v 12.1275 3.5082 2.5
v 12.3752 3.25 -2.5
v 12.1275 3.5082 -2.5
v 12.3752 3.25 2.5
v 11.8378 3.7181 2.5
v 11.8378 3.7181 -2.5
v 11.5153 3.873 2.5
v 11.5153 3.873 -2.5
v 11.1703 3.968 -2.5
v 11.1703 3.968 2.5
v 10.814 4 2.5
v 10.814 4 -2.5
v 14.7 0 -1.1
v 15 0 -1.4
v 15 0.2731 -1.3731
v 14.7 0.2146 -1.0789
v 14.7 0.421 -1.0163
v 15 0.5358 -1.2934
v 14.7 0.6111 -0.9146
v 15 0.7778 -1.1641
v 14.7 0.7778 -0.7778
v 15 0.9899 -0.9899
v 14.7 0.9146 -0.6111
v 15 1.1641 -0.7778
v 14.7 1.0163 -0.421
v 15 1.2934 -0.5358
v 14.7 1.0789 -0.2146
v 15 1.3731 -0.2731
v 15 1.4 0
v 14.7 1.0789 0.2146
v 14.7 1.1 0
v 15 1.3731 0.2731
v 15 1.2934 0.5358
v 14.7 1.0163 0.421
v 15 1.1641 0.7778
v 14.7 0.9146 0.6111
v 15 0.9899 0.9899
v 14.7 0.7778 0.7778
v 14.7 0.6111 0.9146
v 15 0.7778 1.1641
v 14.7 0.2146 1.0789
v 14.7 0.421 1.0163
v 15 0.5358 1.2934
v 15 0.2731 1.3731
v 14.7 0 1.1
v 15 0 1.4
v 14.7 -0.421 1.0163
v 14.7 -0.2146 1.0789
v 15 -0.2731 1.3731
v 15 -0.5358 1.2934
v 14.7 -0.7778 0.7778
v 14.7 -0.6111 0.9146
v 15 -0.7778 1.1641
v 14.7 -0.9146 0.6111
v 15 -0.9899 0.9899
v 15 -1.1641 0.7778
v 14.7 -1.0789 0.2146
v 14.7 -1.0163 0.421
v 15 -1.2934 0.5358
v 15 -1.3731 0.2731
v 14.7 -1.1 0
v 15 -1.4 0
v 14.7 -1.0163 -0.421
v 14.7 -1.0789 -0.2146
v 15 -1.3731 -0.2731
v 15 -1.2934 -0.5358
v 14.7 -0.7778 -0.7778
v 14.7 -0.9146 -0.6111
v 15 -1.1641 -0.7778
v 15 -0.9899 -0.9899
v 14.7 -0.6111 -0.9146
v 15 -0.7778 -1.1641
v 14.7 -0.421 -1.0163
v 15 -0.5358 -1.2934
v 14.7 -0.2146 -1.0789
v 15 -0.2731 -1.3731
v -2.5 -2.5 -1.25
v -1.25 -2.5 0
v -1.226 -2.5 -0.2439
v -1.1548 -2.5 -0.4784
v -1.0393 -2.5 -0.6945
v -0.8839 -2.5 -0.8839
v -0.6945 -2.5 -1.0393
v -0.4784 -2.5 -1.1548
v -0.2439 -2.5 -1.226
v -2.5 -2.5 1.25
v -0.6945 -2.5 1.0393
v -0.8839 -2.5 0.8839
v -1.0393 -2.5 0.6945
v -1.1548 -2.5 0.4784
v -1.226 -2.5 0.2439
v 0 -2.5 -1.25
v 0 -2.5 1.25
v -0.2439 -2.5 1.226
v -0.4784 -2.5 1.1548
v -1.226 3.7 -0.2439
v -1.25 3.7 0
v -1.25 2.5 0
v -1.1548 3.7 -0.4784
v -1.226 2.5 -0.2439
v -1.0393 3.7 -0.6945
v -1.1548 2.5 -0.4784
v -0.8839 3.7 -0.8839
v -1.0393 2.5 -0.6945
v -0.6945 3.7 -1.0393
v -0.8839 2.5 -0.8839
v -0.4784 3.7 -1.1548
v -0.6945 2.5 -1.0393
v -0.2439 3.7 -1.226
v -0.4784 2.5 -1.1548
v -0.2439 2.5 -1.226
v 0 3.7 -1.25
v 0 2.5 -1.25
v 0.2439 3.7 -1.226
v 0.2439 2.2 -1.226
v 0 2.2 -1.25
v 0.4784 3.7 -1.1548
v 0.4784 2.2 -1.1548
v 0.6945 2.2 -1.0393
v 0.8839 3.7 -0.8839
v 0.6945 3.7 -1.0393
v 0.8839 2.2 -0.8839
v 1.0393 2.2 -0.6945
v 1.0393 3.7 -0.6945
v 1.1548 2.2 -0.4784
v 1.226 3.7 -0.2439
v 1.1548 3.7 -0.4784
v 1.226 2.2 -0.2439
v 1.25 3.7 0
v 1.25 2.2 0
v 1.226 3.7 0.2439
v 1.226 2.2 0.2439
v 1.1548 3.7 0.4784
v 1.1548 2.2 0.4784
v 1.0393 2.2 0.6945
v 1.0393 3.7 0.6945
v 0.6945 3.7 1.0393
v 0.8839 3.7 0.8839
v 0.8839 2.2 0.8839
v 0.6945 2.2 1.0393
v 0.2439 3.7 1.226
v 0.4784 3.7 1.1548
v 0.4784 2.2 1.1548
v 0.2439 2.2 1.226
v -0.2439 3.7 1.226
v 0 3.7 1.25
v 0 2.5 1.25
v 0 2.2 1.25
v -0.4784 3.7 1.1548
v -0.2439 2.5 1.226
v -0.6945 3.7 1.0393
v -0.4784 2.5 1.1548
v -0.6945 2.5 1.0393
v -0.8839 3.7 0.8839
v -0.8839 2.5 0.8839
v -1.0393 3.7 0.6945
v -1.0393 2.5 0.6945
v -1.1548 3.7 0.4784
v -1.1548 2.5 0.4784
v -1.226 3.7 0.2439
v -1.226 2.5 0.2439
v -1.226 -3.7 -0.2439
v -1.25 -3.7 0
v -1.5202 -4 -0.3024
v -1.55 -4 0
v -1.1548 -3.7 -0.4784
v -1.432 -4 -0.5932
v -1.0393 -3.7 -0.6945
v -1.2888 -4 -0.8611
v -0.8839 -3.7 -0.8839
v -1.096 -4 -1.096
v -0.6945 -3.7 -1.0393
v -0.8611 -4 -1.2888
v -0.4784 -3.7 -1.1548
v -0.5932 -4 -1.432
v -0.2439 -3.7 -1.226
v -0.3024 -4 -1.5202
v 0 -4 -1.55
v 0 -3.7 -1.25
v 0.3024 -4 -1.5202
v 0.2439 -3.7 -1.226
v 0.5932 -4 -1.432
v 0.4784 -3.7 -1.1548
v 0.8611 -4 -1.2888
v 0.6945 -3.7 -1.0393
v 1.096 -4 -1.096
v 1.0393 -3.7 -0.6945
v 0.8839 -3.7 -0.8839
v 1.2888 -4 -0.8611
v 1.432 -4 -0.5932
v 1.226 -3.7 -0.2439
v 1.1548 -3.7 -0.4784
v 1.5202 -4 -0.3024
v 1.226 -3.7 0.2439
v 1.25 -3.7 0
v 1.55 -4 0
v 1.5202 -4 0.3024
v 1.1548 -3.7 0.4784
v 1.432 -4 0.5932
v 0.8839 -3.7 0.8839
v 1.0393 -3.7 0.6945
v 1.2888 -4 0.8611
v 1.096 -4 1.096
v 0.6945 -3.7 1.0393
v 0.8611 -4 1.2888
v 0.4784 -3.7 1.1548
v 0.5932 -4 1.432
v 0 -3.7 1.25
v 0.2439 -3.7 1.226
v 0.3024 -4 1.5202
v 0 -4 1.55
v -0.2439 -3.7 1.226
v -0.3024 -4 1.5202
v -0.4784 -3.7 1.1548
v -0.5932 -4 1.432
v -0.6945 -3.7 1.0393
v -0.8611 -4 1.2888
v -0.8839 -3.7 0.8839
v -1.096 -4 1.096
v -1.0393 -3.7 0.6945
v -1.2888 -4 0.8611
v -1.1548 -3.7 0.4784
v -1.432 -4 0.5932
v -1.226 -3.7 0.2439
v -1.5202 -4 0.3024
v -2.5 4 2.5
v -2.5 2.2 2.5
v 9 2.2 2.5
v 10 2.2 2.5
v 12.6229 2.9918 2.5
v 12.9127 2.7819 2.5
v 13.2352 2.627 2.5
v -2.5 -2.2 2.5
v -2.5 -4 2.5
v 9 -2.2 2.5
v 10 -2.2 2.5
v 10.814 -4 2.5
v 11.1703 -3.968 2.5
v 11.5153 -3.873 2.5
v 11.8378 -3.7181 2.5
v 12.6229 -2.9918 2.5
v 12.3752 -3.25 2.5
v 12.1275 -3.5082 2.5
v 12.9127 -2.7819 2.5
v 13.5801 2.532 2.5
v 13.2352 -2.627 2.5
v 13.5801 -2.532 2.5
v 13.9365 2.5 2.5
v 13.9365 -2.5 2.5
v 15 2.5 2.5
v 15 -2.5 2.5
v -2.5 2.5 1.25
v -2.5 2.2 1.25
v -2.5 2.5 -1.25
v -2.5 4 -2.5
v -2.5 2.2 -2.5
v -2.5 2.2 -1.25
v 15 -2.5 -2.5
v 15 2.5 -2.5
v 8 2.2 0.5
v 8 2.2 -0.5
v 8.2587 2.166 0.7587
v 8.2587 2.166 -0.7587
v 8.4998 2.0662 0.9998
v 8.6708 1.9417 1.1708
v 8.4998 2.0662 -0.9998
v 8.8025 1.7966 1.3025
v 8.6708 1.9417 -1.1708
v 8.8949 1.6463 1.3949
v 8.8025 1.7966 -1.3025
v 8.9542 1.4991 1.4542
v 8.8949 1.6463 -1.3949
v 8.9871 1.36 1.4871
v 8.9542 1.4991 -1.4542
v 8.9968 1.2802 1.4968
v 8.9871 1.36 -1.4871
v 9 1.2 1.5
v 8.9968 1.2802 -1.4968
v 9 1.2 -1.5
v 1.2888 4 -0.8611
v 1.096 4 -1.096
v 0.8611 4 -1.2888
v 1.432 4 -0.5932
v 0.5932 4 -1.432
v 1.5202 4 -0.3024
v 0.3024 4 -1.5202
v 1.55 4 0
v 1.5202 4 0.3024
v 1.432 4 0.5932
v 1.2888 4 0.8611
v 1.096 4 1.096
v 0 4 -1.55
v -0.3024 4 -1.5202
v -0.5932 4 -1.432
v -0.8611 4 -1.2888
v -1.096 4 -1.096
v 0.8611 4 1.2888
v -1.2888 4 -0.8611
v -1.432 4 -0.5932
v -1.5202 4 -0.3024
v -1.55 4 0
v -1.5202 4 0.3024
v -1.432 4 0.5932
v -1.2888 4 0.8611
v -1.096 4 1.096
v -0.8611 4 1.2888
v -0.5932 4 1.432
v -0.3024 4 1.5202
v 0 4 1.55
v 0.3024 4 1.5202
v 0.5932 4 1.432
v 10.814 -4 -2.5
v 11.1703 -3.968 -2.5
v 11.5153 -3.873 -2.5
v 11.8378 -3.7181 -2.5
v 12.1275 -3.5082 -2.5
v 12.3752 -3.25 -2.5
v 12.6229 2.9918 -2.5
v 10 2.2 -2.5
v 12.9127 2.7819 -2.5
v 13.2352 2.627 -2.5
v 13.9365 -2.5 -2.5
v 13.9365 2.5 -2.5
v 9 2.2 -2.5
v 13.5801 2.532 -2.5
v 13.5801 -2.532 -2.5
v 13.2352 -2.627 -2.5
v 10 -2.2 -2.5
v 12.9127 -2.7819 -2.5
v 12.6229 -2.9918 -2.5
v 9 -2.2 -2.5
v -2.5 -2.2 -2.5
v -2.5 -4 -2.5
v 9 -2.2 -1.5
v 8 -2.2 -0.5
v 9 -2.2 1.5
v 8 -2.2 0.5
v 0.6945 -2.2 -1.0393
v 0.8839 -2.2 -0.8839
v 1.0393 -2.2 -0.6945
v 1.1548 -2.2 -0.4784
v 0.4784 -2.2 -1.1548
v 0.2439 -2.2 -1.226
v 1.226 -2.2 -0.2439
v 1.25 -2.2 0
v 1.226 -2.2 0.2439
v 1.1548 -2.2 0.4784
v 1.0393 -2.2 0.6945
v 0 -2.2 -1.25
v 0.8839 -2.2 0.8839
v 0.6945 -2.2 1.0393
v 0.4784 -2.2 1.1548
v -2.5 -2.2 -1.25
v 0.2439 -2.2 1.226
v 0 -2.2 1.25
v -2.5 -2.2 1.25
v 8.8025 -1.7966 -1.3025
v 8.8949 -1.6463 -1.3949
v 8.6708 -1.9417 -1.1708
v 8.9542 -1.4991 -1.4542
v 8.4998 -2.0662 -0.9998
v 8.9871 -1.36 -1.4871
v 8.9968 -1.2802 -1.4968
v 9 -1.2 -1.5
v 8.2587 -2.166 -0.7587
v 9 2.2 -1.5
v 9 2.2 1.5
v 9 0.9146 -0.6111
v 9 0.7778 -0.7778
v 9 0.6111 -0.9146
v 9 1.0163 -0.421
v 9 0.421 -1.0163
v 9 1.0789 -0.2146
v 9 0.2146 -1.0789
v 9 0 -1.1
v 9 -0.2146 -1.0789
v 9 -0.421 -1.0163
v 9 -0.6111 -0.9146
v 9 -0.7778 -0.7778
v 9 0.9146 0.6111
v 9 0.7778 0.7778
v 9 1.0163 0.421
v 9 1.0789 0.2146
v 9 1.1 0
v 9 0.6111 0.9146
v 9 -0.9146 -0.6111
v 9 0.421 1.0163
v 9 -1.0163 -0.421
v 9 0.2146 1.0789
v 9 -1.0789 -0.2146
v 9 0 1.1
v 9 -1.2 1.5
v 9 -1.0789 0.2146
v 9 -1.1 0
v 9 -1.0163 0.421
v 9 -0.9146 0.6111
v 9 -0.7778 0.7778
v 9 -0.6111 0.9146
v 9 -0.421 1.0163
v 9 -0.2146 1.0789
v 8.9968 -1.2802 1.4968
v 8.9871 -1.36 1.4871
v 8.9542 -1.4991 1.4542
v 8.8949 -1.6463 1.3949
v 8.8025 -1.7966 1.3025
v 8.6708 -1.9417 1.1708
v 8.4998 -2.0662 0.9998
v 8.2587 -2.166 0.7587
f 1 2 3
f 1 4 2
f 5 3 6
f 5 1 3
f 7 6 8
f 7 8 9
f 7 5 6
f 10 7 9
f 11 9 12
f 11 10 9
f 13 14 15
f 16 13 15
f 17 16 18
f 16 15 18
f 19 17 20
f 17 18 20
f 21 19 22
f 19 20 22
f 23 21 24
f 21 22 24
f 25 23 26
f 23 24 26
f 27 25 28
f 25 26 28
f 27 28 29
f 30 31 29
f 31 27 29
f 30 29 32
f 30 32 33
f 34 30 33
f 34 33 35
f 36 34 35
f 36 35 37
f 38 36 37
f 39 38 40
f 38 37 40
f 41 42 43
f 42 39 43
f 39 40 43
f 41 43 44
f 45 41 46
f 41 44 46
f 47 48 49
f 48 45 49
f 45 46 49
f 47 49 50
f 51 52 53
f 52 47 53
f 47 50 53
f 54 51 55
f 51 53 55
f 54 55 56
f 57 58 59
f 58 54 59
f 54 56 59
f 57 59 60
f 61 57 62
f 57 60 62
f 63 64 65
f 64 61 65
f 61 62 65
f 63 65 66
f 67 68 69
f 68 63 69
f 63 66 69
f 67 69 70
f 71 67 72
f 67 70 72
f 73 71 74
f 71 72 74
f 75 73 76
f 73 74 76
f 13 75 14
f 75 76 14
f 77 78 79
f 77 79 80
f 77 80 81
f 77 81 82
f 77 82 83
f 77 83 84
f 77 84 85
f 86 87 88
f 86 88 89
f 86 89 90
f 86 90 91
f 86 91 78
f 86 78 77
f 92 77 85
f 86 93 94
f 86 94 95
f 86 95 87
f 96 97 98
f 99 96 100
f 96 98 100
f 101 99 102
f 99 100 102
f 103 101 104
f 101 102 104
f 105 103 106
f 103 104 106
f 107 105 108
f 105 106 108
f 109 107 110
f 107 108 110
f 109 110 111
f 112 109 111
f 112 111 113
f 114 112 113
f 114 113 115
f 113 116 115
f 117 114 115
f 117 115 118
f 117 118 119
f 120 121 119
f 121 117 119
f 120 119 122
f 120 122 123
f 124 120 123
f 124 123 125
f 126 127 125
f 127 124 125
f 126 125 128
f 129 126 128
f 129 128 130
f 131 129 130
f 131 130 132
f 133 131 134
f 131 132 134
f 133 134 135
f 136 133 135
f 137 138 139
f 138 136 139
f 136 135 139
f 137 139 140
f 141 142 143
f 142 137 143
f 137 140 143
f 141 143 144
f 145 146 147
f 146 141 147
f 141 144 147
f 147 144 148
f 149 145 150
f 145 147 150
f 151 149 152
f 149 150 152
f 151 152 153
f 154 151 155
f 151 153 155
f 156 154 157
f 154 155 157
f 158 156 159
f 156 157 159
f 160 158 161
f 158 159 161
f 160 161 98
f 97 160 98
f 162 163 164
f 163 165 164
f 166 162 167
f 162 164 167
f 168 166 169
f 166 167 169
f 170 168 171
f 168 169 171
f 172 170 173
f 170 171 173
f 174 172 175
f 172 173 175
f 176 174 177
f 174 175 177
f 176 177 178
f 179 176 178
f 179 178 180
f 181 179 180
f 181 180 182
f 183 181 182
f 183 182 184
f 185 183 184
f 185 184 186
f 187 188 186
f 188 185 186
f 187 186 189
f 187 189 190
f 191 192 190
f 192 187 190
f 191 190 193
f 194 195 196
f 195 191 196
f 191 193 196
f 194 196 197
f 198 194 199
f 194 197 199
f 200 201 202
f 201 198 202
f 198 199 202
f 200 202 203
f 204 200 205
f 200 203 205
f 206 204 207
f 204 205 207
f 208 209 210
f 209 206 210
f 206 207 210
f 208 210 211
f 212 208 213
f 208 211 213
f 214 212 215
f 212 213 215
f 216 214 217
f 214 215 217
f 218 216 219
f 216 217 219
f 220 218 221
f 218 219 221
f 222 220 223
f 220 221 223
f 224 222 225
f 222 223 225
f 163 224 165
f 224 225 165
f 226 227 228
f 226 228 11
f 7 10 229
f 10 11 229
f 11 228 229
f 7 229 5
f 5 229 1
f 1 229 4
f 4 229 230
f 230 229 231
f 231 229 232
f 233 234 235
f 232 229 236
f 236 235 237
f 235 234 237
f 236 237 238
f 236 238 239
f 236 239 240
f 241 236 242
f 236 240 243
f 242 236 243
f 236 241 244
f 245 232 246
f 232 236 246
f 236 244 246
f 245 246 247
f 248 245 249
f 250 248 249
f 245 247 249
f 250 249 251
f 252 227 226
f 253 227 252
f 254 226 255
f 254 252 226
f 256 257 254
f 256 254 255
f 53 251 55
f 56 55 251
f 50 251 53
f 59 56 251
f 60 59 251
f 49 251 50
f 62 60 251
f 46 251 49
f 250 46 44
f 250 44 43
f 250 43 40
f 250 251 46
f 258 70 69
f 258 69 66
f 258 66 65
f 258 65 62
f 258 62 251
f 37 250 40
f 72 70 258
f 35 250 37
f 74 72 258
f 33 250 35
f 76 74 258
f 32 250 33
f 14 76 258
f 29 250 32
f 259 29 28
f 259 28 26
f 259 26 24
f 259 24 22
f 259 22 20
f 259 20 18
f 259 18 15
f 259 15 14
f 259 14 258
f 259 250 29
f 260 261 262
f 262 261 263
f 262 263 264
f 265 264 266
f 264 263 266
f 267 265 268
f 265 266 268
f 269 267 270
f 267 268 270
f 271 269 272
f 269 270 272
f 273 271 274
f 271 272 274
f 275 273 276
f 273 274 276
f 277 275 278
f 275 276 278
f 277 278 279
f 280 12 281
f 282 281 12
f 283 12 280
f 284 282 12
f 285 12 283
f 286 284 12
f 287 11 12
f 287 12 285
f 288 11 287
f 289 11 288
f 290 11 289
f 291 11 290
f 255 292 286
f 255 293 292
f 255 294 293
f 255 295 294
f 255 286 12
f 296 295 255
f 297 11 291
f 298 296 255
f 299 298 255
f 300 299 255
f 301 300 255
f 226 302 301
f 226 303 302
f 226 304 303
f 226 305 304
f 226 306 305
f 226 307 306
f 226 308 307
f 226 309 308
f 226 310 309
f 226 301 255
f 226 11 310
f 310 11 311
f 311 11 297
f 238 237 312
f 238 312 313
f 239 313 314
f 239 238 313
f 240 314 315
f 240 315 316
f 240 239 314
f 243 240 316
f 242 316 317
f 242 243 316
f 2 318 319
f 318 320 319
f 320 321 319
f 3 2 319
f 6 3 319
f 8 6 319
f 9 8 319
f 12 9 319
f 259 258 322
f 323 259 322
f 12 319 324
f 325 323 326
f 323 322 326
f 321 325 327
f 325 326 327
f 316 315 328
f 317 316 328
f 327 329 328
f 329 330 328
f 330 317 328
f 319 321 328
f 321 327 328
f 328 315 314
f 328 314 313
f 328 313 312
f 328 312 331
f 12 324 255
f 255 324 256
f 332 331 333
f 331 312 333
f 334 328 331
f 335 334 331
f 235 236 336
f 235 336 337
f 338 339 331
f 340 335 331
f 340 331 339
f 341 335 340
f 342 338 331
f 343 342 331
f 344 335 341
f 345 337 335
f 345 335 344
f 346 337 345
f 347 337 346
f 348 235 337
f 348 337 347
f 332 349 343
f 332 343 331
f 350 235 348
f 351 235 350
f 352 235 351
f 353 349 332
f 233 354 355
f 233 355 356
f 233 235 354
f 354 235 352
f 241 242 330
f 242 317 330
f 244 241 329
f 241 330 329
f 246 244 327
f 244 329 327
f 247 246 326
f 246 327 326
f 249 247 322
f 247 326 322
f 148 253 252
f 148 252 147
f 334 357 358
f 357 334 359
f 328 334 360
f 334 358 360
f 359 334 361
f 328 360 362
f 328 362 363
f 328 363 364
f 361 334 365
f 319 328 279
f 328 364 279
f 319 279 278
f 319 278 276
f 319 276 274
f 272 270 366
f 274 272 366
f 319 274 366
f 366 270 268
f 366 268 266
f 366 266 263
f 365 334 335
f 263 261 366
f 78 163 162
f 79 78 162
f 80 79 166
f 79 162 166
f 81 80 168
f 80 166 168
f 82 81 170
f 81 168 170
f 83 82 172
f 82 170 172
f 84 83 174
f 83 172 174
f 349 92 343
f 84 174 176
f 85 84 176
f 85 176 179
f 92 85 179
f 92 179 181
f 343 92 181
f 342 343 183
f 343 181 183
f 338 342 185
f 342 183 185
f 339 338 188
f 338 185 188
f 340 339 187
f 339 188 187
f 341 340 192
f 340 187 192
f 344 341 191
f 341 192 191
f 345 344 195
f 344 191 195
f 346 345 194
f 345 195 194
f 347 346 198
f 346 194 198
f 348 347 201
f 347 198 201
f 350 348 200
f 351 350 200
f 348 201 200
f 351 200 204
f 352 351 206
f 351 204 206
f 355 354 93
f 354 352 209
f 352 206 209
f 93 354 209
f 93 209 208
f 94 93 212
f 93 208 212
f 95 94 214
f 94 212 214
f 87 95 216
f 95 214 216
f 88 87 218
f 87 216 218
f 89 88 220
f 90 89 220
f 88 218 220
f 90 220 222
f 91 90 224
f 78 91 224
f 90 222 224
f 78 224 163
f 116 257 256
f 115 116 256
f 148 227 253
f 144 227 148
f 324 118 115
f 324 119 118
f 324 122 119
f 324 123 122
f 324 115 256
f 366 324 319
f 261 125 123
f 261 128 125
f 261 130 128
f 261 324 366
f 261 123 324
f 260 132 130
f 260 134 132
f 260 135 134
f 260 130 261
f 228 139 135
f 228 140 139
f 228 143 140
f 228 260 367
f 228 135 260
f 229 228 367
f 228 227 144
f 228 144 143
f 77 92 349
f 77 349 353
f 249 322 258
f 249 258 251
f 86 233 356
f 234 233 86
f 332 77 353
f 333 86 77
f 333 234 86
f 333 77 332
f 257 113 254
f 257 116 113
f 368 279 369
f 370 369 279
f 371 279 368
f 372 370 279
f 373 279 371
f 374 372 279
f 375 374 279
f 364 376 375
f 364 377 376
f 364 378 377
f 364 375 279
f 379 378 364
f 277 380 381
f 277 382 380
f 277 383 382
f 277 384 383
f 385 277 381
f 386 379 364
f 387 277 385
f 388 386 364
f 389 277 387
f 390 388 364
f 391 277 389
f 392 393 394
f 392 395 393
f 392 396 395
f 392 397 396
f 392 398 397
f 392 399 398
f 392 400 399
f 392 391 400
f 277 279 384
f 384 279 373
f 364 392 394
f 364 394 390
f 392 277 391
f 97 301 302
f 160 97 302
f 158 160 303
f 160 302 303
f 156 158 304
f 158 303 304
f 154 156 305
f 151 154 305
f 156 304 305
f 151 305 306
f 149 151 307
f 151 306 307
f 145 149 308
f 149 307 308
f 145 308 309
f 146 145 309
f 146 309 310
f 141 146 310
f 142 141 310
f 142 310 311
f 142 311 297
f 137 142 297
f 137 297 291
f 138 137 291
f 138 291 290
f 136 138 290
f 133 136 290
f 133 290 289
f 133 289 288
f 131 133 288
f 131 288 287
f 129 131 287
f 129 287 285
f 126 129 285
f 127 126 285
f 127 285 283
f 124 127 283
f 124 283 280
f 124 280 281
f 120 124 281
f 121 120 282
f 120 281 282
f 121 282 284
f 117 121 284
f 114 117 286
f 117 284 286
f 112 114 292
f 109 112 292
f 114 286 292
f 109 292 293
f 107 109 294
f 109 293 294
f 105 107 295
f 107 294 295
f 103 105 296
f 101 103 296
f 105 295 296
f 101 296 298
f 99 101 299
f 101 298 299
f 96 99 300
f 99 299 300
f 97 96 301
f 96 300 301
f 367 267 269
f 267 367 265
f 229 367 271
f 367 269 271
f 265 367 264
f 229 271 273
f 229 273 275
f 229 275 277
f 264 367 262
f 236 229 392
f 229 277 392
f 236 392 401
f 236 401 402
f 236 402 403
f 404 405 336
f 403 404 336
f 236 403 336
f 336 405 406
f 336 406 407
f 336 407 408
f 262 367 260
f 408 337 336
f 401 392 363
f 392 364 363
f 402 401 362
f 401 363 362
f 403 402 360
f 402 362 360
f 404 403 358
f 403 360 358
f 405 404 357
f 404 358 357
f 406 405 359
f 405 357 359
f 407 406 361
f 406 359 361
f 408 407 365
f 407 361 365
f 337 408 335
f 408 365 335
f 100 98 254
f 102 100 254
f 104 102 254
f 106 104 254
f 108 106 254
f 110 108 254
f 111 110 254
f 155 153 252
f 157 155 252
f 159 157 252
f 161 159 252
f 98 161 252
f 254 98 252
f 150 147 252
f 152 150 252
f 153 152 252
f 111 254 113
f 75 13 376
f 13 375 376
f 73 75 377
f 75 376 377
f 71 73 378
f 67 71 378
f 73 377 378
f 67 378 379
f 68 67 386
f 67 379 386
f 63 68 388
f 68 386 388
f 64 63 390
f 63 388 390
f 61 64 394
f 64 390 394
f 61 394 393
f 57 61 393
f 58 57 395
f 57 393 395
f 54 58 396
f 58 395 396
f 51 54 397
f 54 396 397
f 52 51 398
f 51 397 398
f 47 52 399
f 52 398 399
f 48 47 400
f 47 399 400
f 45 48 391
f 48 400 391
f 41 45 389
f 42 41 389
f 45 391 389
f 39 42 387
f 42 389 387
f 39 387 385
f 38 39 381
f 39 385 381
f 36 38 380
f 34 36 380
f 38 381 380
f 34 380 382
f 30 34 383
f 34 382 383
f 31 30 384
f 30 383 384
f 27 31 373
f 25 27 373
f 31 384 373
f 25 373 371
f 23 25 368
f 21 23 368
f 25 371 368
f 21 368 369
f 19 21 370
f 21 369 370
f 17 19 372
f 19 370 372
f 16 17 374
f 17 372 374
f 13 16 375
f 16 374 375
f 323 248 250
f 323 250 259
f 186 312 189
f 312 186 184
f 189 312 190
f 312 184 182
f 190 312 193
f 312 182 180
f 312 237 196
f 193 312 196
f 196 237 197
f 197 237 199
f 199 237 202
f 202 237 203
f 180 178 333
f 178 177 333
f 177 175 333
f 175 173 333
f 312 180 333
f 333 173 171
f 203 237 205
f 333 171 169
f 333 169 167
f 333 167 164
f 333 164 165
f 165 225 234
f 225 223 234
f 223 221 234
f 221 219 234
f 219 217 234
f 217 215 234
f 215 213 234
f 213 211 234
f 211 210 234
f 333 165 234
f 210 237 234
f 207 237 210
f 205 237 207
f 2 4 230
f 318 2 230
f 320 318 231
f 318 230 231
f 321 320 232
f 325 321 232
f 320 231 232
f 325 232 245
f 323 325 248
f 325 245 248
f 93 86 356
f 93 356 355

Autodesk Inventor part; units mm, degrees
ref_plane "YZ Plane" through (0, 0, 0) normal (1, 0, 0) x (0, 1, 0)
ref_plane "XZ Plane" through (0, 0, 0) normal (0, 1, 0) x (-1, 0, 0)
ref_plane "XY Plane" through (0, 0, 0) normal (0, 0, 1) x (1, 0, 0)
sketch "スケッチ1" plane through (0, 0, 0) normal (0, 1, 0) x (-1, 0, 0)
  line L0 (0, 2.5) -> (-12, 2.5)
  line L1 (-12, 2.5) -> (-12, -2.5)
  line L2 (-12, -2.5) -> (0, -2.5)
  arc A0 (0, -2.5) -> (0, 2.5) centre (0, 0) ccw
  circle A1 centre (0, 0) radius 1.25
  line L3 (0, 2.5) -> (2.5, 2.5)
  line L4 (2.5, 2.5) -> (2.5, -2.5)
  line L5 (2.5, -2.5) -> (0, -2.5)
  point P0 (2.5, 0)
  dimension "d0" = 2.5
  dimension "d1" = 2.5
  dimension "d2" = 12
extrude "押し出し1" add sketch "スケッチ1" along normal mid plane 8
sketch "スケッチ7" plane through (-2.5, 4, 2.5) normal (0, 0, 1) x (1, 0, 0)
  line L0 (14.5, 0) -> (14.5, -8) projected
  line L1 (0, -8) -> (0, 0) projected
  line L2 (0, -8) -> (0, 0) projected
  line L3 (0, -1.8) -> (11.5, -1.8)
  line L4 (11.5, -1.8) -> (11.5, -6.2)
  line L5 (11.5, -6.2) -> (0, -6.2)
  line L6 (0, -6.2) -> (0, -1.8)
  line L7 (0, 0) -> (14.5, 0) projected
  point P0 (2.5, -4)
  point P1 (0, -4)
  point P2 (0, -1.8)
  point P3 (0, -6.2)
  dimension "d32" = 3
  dimension "d46" = 4.4
  dimension "d47" = 1.8
extrude "押し出し5" cut sketch "スケッチ7" against normal through all
sketch "スケッチ3" plane through (12, -4, 2.5) normal (1, 0, 0) x (0, 0, -1)
  line L0 (5, 0) -> (5, 8) projected
  line L1 (0, 8) -> (0, 0) projected
  line L2 (0, 6.5) -> (5, 6.5)
  line L3 (5, 6.5) -> (5, 1.5)
  line L4 (5, 1.5) -> (0, 1.5)
  line L5 (0, 1.5) -> (0, 6.5)
  point P0 (2.5, 4)
  point P1 (0, 4)
  point P2 (0, 4)
  point P3 (0, 6.5)
extrude "押し出し3" add sketch "スケッチ3" along normal blind 3
sketch "スケッチ5" plane through (0, 0, 0) normal (0, 1, 0) x (-1, 0, 0)
  line L0 (6.0321, 1.25) -> (0, 1.25)
  line L1 (0, 1.25) -> (0, -1.25)
  line L2 (0, -1.25) -> (6.0321, -1.25)
  line L3 (6.0321, -1.25) -> (6.0321, 1.25)
  circle A0 centre (0, 0) radius 1.25 projected
extrude "押し出し4" cut sketch "スケッチ5" along normal mid plane 5 contours L3 L2 A0 L0 | A0 L1 picked at (0.2598, 0.3258)
sketch "スケッチ8" plane through (15, -4, 2.5) normal (1, 0, 0) x (0, 0, -1)
  point P0 (2.5, 4)
  point P1 (2.5, 4)
hole "穴3" at (15, 0, 0) direction (-1, 0, 0) diameter 2.2 end through all
fillet "フィレット2" radius 2 4 edges at (12, 4, 0) (12, -4, 0) (12, -2.5, 0) (12, 2.5, 0)
chamfer "面取り1" distance 0.3 angle 45 3 edges at (1.25, 4, 0) (1.25, -4, 0) (15, 0, 1.1)
chamfer "面取り2" distance 1 angle 45 2 edges at (9, 0, 2.5) (9, 0, -2.5)
fillet "フィレット4" radius 1 2 edges at (9, 2.2, 0) (9, -2.2, 0)
properties part number "gear_1" material "ABS プラスチック"
